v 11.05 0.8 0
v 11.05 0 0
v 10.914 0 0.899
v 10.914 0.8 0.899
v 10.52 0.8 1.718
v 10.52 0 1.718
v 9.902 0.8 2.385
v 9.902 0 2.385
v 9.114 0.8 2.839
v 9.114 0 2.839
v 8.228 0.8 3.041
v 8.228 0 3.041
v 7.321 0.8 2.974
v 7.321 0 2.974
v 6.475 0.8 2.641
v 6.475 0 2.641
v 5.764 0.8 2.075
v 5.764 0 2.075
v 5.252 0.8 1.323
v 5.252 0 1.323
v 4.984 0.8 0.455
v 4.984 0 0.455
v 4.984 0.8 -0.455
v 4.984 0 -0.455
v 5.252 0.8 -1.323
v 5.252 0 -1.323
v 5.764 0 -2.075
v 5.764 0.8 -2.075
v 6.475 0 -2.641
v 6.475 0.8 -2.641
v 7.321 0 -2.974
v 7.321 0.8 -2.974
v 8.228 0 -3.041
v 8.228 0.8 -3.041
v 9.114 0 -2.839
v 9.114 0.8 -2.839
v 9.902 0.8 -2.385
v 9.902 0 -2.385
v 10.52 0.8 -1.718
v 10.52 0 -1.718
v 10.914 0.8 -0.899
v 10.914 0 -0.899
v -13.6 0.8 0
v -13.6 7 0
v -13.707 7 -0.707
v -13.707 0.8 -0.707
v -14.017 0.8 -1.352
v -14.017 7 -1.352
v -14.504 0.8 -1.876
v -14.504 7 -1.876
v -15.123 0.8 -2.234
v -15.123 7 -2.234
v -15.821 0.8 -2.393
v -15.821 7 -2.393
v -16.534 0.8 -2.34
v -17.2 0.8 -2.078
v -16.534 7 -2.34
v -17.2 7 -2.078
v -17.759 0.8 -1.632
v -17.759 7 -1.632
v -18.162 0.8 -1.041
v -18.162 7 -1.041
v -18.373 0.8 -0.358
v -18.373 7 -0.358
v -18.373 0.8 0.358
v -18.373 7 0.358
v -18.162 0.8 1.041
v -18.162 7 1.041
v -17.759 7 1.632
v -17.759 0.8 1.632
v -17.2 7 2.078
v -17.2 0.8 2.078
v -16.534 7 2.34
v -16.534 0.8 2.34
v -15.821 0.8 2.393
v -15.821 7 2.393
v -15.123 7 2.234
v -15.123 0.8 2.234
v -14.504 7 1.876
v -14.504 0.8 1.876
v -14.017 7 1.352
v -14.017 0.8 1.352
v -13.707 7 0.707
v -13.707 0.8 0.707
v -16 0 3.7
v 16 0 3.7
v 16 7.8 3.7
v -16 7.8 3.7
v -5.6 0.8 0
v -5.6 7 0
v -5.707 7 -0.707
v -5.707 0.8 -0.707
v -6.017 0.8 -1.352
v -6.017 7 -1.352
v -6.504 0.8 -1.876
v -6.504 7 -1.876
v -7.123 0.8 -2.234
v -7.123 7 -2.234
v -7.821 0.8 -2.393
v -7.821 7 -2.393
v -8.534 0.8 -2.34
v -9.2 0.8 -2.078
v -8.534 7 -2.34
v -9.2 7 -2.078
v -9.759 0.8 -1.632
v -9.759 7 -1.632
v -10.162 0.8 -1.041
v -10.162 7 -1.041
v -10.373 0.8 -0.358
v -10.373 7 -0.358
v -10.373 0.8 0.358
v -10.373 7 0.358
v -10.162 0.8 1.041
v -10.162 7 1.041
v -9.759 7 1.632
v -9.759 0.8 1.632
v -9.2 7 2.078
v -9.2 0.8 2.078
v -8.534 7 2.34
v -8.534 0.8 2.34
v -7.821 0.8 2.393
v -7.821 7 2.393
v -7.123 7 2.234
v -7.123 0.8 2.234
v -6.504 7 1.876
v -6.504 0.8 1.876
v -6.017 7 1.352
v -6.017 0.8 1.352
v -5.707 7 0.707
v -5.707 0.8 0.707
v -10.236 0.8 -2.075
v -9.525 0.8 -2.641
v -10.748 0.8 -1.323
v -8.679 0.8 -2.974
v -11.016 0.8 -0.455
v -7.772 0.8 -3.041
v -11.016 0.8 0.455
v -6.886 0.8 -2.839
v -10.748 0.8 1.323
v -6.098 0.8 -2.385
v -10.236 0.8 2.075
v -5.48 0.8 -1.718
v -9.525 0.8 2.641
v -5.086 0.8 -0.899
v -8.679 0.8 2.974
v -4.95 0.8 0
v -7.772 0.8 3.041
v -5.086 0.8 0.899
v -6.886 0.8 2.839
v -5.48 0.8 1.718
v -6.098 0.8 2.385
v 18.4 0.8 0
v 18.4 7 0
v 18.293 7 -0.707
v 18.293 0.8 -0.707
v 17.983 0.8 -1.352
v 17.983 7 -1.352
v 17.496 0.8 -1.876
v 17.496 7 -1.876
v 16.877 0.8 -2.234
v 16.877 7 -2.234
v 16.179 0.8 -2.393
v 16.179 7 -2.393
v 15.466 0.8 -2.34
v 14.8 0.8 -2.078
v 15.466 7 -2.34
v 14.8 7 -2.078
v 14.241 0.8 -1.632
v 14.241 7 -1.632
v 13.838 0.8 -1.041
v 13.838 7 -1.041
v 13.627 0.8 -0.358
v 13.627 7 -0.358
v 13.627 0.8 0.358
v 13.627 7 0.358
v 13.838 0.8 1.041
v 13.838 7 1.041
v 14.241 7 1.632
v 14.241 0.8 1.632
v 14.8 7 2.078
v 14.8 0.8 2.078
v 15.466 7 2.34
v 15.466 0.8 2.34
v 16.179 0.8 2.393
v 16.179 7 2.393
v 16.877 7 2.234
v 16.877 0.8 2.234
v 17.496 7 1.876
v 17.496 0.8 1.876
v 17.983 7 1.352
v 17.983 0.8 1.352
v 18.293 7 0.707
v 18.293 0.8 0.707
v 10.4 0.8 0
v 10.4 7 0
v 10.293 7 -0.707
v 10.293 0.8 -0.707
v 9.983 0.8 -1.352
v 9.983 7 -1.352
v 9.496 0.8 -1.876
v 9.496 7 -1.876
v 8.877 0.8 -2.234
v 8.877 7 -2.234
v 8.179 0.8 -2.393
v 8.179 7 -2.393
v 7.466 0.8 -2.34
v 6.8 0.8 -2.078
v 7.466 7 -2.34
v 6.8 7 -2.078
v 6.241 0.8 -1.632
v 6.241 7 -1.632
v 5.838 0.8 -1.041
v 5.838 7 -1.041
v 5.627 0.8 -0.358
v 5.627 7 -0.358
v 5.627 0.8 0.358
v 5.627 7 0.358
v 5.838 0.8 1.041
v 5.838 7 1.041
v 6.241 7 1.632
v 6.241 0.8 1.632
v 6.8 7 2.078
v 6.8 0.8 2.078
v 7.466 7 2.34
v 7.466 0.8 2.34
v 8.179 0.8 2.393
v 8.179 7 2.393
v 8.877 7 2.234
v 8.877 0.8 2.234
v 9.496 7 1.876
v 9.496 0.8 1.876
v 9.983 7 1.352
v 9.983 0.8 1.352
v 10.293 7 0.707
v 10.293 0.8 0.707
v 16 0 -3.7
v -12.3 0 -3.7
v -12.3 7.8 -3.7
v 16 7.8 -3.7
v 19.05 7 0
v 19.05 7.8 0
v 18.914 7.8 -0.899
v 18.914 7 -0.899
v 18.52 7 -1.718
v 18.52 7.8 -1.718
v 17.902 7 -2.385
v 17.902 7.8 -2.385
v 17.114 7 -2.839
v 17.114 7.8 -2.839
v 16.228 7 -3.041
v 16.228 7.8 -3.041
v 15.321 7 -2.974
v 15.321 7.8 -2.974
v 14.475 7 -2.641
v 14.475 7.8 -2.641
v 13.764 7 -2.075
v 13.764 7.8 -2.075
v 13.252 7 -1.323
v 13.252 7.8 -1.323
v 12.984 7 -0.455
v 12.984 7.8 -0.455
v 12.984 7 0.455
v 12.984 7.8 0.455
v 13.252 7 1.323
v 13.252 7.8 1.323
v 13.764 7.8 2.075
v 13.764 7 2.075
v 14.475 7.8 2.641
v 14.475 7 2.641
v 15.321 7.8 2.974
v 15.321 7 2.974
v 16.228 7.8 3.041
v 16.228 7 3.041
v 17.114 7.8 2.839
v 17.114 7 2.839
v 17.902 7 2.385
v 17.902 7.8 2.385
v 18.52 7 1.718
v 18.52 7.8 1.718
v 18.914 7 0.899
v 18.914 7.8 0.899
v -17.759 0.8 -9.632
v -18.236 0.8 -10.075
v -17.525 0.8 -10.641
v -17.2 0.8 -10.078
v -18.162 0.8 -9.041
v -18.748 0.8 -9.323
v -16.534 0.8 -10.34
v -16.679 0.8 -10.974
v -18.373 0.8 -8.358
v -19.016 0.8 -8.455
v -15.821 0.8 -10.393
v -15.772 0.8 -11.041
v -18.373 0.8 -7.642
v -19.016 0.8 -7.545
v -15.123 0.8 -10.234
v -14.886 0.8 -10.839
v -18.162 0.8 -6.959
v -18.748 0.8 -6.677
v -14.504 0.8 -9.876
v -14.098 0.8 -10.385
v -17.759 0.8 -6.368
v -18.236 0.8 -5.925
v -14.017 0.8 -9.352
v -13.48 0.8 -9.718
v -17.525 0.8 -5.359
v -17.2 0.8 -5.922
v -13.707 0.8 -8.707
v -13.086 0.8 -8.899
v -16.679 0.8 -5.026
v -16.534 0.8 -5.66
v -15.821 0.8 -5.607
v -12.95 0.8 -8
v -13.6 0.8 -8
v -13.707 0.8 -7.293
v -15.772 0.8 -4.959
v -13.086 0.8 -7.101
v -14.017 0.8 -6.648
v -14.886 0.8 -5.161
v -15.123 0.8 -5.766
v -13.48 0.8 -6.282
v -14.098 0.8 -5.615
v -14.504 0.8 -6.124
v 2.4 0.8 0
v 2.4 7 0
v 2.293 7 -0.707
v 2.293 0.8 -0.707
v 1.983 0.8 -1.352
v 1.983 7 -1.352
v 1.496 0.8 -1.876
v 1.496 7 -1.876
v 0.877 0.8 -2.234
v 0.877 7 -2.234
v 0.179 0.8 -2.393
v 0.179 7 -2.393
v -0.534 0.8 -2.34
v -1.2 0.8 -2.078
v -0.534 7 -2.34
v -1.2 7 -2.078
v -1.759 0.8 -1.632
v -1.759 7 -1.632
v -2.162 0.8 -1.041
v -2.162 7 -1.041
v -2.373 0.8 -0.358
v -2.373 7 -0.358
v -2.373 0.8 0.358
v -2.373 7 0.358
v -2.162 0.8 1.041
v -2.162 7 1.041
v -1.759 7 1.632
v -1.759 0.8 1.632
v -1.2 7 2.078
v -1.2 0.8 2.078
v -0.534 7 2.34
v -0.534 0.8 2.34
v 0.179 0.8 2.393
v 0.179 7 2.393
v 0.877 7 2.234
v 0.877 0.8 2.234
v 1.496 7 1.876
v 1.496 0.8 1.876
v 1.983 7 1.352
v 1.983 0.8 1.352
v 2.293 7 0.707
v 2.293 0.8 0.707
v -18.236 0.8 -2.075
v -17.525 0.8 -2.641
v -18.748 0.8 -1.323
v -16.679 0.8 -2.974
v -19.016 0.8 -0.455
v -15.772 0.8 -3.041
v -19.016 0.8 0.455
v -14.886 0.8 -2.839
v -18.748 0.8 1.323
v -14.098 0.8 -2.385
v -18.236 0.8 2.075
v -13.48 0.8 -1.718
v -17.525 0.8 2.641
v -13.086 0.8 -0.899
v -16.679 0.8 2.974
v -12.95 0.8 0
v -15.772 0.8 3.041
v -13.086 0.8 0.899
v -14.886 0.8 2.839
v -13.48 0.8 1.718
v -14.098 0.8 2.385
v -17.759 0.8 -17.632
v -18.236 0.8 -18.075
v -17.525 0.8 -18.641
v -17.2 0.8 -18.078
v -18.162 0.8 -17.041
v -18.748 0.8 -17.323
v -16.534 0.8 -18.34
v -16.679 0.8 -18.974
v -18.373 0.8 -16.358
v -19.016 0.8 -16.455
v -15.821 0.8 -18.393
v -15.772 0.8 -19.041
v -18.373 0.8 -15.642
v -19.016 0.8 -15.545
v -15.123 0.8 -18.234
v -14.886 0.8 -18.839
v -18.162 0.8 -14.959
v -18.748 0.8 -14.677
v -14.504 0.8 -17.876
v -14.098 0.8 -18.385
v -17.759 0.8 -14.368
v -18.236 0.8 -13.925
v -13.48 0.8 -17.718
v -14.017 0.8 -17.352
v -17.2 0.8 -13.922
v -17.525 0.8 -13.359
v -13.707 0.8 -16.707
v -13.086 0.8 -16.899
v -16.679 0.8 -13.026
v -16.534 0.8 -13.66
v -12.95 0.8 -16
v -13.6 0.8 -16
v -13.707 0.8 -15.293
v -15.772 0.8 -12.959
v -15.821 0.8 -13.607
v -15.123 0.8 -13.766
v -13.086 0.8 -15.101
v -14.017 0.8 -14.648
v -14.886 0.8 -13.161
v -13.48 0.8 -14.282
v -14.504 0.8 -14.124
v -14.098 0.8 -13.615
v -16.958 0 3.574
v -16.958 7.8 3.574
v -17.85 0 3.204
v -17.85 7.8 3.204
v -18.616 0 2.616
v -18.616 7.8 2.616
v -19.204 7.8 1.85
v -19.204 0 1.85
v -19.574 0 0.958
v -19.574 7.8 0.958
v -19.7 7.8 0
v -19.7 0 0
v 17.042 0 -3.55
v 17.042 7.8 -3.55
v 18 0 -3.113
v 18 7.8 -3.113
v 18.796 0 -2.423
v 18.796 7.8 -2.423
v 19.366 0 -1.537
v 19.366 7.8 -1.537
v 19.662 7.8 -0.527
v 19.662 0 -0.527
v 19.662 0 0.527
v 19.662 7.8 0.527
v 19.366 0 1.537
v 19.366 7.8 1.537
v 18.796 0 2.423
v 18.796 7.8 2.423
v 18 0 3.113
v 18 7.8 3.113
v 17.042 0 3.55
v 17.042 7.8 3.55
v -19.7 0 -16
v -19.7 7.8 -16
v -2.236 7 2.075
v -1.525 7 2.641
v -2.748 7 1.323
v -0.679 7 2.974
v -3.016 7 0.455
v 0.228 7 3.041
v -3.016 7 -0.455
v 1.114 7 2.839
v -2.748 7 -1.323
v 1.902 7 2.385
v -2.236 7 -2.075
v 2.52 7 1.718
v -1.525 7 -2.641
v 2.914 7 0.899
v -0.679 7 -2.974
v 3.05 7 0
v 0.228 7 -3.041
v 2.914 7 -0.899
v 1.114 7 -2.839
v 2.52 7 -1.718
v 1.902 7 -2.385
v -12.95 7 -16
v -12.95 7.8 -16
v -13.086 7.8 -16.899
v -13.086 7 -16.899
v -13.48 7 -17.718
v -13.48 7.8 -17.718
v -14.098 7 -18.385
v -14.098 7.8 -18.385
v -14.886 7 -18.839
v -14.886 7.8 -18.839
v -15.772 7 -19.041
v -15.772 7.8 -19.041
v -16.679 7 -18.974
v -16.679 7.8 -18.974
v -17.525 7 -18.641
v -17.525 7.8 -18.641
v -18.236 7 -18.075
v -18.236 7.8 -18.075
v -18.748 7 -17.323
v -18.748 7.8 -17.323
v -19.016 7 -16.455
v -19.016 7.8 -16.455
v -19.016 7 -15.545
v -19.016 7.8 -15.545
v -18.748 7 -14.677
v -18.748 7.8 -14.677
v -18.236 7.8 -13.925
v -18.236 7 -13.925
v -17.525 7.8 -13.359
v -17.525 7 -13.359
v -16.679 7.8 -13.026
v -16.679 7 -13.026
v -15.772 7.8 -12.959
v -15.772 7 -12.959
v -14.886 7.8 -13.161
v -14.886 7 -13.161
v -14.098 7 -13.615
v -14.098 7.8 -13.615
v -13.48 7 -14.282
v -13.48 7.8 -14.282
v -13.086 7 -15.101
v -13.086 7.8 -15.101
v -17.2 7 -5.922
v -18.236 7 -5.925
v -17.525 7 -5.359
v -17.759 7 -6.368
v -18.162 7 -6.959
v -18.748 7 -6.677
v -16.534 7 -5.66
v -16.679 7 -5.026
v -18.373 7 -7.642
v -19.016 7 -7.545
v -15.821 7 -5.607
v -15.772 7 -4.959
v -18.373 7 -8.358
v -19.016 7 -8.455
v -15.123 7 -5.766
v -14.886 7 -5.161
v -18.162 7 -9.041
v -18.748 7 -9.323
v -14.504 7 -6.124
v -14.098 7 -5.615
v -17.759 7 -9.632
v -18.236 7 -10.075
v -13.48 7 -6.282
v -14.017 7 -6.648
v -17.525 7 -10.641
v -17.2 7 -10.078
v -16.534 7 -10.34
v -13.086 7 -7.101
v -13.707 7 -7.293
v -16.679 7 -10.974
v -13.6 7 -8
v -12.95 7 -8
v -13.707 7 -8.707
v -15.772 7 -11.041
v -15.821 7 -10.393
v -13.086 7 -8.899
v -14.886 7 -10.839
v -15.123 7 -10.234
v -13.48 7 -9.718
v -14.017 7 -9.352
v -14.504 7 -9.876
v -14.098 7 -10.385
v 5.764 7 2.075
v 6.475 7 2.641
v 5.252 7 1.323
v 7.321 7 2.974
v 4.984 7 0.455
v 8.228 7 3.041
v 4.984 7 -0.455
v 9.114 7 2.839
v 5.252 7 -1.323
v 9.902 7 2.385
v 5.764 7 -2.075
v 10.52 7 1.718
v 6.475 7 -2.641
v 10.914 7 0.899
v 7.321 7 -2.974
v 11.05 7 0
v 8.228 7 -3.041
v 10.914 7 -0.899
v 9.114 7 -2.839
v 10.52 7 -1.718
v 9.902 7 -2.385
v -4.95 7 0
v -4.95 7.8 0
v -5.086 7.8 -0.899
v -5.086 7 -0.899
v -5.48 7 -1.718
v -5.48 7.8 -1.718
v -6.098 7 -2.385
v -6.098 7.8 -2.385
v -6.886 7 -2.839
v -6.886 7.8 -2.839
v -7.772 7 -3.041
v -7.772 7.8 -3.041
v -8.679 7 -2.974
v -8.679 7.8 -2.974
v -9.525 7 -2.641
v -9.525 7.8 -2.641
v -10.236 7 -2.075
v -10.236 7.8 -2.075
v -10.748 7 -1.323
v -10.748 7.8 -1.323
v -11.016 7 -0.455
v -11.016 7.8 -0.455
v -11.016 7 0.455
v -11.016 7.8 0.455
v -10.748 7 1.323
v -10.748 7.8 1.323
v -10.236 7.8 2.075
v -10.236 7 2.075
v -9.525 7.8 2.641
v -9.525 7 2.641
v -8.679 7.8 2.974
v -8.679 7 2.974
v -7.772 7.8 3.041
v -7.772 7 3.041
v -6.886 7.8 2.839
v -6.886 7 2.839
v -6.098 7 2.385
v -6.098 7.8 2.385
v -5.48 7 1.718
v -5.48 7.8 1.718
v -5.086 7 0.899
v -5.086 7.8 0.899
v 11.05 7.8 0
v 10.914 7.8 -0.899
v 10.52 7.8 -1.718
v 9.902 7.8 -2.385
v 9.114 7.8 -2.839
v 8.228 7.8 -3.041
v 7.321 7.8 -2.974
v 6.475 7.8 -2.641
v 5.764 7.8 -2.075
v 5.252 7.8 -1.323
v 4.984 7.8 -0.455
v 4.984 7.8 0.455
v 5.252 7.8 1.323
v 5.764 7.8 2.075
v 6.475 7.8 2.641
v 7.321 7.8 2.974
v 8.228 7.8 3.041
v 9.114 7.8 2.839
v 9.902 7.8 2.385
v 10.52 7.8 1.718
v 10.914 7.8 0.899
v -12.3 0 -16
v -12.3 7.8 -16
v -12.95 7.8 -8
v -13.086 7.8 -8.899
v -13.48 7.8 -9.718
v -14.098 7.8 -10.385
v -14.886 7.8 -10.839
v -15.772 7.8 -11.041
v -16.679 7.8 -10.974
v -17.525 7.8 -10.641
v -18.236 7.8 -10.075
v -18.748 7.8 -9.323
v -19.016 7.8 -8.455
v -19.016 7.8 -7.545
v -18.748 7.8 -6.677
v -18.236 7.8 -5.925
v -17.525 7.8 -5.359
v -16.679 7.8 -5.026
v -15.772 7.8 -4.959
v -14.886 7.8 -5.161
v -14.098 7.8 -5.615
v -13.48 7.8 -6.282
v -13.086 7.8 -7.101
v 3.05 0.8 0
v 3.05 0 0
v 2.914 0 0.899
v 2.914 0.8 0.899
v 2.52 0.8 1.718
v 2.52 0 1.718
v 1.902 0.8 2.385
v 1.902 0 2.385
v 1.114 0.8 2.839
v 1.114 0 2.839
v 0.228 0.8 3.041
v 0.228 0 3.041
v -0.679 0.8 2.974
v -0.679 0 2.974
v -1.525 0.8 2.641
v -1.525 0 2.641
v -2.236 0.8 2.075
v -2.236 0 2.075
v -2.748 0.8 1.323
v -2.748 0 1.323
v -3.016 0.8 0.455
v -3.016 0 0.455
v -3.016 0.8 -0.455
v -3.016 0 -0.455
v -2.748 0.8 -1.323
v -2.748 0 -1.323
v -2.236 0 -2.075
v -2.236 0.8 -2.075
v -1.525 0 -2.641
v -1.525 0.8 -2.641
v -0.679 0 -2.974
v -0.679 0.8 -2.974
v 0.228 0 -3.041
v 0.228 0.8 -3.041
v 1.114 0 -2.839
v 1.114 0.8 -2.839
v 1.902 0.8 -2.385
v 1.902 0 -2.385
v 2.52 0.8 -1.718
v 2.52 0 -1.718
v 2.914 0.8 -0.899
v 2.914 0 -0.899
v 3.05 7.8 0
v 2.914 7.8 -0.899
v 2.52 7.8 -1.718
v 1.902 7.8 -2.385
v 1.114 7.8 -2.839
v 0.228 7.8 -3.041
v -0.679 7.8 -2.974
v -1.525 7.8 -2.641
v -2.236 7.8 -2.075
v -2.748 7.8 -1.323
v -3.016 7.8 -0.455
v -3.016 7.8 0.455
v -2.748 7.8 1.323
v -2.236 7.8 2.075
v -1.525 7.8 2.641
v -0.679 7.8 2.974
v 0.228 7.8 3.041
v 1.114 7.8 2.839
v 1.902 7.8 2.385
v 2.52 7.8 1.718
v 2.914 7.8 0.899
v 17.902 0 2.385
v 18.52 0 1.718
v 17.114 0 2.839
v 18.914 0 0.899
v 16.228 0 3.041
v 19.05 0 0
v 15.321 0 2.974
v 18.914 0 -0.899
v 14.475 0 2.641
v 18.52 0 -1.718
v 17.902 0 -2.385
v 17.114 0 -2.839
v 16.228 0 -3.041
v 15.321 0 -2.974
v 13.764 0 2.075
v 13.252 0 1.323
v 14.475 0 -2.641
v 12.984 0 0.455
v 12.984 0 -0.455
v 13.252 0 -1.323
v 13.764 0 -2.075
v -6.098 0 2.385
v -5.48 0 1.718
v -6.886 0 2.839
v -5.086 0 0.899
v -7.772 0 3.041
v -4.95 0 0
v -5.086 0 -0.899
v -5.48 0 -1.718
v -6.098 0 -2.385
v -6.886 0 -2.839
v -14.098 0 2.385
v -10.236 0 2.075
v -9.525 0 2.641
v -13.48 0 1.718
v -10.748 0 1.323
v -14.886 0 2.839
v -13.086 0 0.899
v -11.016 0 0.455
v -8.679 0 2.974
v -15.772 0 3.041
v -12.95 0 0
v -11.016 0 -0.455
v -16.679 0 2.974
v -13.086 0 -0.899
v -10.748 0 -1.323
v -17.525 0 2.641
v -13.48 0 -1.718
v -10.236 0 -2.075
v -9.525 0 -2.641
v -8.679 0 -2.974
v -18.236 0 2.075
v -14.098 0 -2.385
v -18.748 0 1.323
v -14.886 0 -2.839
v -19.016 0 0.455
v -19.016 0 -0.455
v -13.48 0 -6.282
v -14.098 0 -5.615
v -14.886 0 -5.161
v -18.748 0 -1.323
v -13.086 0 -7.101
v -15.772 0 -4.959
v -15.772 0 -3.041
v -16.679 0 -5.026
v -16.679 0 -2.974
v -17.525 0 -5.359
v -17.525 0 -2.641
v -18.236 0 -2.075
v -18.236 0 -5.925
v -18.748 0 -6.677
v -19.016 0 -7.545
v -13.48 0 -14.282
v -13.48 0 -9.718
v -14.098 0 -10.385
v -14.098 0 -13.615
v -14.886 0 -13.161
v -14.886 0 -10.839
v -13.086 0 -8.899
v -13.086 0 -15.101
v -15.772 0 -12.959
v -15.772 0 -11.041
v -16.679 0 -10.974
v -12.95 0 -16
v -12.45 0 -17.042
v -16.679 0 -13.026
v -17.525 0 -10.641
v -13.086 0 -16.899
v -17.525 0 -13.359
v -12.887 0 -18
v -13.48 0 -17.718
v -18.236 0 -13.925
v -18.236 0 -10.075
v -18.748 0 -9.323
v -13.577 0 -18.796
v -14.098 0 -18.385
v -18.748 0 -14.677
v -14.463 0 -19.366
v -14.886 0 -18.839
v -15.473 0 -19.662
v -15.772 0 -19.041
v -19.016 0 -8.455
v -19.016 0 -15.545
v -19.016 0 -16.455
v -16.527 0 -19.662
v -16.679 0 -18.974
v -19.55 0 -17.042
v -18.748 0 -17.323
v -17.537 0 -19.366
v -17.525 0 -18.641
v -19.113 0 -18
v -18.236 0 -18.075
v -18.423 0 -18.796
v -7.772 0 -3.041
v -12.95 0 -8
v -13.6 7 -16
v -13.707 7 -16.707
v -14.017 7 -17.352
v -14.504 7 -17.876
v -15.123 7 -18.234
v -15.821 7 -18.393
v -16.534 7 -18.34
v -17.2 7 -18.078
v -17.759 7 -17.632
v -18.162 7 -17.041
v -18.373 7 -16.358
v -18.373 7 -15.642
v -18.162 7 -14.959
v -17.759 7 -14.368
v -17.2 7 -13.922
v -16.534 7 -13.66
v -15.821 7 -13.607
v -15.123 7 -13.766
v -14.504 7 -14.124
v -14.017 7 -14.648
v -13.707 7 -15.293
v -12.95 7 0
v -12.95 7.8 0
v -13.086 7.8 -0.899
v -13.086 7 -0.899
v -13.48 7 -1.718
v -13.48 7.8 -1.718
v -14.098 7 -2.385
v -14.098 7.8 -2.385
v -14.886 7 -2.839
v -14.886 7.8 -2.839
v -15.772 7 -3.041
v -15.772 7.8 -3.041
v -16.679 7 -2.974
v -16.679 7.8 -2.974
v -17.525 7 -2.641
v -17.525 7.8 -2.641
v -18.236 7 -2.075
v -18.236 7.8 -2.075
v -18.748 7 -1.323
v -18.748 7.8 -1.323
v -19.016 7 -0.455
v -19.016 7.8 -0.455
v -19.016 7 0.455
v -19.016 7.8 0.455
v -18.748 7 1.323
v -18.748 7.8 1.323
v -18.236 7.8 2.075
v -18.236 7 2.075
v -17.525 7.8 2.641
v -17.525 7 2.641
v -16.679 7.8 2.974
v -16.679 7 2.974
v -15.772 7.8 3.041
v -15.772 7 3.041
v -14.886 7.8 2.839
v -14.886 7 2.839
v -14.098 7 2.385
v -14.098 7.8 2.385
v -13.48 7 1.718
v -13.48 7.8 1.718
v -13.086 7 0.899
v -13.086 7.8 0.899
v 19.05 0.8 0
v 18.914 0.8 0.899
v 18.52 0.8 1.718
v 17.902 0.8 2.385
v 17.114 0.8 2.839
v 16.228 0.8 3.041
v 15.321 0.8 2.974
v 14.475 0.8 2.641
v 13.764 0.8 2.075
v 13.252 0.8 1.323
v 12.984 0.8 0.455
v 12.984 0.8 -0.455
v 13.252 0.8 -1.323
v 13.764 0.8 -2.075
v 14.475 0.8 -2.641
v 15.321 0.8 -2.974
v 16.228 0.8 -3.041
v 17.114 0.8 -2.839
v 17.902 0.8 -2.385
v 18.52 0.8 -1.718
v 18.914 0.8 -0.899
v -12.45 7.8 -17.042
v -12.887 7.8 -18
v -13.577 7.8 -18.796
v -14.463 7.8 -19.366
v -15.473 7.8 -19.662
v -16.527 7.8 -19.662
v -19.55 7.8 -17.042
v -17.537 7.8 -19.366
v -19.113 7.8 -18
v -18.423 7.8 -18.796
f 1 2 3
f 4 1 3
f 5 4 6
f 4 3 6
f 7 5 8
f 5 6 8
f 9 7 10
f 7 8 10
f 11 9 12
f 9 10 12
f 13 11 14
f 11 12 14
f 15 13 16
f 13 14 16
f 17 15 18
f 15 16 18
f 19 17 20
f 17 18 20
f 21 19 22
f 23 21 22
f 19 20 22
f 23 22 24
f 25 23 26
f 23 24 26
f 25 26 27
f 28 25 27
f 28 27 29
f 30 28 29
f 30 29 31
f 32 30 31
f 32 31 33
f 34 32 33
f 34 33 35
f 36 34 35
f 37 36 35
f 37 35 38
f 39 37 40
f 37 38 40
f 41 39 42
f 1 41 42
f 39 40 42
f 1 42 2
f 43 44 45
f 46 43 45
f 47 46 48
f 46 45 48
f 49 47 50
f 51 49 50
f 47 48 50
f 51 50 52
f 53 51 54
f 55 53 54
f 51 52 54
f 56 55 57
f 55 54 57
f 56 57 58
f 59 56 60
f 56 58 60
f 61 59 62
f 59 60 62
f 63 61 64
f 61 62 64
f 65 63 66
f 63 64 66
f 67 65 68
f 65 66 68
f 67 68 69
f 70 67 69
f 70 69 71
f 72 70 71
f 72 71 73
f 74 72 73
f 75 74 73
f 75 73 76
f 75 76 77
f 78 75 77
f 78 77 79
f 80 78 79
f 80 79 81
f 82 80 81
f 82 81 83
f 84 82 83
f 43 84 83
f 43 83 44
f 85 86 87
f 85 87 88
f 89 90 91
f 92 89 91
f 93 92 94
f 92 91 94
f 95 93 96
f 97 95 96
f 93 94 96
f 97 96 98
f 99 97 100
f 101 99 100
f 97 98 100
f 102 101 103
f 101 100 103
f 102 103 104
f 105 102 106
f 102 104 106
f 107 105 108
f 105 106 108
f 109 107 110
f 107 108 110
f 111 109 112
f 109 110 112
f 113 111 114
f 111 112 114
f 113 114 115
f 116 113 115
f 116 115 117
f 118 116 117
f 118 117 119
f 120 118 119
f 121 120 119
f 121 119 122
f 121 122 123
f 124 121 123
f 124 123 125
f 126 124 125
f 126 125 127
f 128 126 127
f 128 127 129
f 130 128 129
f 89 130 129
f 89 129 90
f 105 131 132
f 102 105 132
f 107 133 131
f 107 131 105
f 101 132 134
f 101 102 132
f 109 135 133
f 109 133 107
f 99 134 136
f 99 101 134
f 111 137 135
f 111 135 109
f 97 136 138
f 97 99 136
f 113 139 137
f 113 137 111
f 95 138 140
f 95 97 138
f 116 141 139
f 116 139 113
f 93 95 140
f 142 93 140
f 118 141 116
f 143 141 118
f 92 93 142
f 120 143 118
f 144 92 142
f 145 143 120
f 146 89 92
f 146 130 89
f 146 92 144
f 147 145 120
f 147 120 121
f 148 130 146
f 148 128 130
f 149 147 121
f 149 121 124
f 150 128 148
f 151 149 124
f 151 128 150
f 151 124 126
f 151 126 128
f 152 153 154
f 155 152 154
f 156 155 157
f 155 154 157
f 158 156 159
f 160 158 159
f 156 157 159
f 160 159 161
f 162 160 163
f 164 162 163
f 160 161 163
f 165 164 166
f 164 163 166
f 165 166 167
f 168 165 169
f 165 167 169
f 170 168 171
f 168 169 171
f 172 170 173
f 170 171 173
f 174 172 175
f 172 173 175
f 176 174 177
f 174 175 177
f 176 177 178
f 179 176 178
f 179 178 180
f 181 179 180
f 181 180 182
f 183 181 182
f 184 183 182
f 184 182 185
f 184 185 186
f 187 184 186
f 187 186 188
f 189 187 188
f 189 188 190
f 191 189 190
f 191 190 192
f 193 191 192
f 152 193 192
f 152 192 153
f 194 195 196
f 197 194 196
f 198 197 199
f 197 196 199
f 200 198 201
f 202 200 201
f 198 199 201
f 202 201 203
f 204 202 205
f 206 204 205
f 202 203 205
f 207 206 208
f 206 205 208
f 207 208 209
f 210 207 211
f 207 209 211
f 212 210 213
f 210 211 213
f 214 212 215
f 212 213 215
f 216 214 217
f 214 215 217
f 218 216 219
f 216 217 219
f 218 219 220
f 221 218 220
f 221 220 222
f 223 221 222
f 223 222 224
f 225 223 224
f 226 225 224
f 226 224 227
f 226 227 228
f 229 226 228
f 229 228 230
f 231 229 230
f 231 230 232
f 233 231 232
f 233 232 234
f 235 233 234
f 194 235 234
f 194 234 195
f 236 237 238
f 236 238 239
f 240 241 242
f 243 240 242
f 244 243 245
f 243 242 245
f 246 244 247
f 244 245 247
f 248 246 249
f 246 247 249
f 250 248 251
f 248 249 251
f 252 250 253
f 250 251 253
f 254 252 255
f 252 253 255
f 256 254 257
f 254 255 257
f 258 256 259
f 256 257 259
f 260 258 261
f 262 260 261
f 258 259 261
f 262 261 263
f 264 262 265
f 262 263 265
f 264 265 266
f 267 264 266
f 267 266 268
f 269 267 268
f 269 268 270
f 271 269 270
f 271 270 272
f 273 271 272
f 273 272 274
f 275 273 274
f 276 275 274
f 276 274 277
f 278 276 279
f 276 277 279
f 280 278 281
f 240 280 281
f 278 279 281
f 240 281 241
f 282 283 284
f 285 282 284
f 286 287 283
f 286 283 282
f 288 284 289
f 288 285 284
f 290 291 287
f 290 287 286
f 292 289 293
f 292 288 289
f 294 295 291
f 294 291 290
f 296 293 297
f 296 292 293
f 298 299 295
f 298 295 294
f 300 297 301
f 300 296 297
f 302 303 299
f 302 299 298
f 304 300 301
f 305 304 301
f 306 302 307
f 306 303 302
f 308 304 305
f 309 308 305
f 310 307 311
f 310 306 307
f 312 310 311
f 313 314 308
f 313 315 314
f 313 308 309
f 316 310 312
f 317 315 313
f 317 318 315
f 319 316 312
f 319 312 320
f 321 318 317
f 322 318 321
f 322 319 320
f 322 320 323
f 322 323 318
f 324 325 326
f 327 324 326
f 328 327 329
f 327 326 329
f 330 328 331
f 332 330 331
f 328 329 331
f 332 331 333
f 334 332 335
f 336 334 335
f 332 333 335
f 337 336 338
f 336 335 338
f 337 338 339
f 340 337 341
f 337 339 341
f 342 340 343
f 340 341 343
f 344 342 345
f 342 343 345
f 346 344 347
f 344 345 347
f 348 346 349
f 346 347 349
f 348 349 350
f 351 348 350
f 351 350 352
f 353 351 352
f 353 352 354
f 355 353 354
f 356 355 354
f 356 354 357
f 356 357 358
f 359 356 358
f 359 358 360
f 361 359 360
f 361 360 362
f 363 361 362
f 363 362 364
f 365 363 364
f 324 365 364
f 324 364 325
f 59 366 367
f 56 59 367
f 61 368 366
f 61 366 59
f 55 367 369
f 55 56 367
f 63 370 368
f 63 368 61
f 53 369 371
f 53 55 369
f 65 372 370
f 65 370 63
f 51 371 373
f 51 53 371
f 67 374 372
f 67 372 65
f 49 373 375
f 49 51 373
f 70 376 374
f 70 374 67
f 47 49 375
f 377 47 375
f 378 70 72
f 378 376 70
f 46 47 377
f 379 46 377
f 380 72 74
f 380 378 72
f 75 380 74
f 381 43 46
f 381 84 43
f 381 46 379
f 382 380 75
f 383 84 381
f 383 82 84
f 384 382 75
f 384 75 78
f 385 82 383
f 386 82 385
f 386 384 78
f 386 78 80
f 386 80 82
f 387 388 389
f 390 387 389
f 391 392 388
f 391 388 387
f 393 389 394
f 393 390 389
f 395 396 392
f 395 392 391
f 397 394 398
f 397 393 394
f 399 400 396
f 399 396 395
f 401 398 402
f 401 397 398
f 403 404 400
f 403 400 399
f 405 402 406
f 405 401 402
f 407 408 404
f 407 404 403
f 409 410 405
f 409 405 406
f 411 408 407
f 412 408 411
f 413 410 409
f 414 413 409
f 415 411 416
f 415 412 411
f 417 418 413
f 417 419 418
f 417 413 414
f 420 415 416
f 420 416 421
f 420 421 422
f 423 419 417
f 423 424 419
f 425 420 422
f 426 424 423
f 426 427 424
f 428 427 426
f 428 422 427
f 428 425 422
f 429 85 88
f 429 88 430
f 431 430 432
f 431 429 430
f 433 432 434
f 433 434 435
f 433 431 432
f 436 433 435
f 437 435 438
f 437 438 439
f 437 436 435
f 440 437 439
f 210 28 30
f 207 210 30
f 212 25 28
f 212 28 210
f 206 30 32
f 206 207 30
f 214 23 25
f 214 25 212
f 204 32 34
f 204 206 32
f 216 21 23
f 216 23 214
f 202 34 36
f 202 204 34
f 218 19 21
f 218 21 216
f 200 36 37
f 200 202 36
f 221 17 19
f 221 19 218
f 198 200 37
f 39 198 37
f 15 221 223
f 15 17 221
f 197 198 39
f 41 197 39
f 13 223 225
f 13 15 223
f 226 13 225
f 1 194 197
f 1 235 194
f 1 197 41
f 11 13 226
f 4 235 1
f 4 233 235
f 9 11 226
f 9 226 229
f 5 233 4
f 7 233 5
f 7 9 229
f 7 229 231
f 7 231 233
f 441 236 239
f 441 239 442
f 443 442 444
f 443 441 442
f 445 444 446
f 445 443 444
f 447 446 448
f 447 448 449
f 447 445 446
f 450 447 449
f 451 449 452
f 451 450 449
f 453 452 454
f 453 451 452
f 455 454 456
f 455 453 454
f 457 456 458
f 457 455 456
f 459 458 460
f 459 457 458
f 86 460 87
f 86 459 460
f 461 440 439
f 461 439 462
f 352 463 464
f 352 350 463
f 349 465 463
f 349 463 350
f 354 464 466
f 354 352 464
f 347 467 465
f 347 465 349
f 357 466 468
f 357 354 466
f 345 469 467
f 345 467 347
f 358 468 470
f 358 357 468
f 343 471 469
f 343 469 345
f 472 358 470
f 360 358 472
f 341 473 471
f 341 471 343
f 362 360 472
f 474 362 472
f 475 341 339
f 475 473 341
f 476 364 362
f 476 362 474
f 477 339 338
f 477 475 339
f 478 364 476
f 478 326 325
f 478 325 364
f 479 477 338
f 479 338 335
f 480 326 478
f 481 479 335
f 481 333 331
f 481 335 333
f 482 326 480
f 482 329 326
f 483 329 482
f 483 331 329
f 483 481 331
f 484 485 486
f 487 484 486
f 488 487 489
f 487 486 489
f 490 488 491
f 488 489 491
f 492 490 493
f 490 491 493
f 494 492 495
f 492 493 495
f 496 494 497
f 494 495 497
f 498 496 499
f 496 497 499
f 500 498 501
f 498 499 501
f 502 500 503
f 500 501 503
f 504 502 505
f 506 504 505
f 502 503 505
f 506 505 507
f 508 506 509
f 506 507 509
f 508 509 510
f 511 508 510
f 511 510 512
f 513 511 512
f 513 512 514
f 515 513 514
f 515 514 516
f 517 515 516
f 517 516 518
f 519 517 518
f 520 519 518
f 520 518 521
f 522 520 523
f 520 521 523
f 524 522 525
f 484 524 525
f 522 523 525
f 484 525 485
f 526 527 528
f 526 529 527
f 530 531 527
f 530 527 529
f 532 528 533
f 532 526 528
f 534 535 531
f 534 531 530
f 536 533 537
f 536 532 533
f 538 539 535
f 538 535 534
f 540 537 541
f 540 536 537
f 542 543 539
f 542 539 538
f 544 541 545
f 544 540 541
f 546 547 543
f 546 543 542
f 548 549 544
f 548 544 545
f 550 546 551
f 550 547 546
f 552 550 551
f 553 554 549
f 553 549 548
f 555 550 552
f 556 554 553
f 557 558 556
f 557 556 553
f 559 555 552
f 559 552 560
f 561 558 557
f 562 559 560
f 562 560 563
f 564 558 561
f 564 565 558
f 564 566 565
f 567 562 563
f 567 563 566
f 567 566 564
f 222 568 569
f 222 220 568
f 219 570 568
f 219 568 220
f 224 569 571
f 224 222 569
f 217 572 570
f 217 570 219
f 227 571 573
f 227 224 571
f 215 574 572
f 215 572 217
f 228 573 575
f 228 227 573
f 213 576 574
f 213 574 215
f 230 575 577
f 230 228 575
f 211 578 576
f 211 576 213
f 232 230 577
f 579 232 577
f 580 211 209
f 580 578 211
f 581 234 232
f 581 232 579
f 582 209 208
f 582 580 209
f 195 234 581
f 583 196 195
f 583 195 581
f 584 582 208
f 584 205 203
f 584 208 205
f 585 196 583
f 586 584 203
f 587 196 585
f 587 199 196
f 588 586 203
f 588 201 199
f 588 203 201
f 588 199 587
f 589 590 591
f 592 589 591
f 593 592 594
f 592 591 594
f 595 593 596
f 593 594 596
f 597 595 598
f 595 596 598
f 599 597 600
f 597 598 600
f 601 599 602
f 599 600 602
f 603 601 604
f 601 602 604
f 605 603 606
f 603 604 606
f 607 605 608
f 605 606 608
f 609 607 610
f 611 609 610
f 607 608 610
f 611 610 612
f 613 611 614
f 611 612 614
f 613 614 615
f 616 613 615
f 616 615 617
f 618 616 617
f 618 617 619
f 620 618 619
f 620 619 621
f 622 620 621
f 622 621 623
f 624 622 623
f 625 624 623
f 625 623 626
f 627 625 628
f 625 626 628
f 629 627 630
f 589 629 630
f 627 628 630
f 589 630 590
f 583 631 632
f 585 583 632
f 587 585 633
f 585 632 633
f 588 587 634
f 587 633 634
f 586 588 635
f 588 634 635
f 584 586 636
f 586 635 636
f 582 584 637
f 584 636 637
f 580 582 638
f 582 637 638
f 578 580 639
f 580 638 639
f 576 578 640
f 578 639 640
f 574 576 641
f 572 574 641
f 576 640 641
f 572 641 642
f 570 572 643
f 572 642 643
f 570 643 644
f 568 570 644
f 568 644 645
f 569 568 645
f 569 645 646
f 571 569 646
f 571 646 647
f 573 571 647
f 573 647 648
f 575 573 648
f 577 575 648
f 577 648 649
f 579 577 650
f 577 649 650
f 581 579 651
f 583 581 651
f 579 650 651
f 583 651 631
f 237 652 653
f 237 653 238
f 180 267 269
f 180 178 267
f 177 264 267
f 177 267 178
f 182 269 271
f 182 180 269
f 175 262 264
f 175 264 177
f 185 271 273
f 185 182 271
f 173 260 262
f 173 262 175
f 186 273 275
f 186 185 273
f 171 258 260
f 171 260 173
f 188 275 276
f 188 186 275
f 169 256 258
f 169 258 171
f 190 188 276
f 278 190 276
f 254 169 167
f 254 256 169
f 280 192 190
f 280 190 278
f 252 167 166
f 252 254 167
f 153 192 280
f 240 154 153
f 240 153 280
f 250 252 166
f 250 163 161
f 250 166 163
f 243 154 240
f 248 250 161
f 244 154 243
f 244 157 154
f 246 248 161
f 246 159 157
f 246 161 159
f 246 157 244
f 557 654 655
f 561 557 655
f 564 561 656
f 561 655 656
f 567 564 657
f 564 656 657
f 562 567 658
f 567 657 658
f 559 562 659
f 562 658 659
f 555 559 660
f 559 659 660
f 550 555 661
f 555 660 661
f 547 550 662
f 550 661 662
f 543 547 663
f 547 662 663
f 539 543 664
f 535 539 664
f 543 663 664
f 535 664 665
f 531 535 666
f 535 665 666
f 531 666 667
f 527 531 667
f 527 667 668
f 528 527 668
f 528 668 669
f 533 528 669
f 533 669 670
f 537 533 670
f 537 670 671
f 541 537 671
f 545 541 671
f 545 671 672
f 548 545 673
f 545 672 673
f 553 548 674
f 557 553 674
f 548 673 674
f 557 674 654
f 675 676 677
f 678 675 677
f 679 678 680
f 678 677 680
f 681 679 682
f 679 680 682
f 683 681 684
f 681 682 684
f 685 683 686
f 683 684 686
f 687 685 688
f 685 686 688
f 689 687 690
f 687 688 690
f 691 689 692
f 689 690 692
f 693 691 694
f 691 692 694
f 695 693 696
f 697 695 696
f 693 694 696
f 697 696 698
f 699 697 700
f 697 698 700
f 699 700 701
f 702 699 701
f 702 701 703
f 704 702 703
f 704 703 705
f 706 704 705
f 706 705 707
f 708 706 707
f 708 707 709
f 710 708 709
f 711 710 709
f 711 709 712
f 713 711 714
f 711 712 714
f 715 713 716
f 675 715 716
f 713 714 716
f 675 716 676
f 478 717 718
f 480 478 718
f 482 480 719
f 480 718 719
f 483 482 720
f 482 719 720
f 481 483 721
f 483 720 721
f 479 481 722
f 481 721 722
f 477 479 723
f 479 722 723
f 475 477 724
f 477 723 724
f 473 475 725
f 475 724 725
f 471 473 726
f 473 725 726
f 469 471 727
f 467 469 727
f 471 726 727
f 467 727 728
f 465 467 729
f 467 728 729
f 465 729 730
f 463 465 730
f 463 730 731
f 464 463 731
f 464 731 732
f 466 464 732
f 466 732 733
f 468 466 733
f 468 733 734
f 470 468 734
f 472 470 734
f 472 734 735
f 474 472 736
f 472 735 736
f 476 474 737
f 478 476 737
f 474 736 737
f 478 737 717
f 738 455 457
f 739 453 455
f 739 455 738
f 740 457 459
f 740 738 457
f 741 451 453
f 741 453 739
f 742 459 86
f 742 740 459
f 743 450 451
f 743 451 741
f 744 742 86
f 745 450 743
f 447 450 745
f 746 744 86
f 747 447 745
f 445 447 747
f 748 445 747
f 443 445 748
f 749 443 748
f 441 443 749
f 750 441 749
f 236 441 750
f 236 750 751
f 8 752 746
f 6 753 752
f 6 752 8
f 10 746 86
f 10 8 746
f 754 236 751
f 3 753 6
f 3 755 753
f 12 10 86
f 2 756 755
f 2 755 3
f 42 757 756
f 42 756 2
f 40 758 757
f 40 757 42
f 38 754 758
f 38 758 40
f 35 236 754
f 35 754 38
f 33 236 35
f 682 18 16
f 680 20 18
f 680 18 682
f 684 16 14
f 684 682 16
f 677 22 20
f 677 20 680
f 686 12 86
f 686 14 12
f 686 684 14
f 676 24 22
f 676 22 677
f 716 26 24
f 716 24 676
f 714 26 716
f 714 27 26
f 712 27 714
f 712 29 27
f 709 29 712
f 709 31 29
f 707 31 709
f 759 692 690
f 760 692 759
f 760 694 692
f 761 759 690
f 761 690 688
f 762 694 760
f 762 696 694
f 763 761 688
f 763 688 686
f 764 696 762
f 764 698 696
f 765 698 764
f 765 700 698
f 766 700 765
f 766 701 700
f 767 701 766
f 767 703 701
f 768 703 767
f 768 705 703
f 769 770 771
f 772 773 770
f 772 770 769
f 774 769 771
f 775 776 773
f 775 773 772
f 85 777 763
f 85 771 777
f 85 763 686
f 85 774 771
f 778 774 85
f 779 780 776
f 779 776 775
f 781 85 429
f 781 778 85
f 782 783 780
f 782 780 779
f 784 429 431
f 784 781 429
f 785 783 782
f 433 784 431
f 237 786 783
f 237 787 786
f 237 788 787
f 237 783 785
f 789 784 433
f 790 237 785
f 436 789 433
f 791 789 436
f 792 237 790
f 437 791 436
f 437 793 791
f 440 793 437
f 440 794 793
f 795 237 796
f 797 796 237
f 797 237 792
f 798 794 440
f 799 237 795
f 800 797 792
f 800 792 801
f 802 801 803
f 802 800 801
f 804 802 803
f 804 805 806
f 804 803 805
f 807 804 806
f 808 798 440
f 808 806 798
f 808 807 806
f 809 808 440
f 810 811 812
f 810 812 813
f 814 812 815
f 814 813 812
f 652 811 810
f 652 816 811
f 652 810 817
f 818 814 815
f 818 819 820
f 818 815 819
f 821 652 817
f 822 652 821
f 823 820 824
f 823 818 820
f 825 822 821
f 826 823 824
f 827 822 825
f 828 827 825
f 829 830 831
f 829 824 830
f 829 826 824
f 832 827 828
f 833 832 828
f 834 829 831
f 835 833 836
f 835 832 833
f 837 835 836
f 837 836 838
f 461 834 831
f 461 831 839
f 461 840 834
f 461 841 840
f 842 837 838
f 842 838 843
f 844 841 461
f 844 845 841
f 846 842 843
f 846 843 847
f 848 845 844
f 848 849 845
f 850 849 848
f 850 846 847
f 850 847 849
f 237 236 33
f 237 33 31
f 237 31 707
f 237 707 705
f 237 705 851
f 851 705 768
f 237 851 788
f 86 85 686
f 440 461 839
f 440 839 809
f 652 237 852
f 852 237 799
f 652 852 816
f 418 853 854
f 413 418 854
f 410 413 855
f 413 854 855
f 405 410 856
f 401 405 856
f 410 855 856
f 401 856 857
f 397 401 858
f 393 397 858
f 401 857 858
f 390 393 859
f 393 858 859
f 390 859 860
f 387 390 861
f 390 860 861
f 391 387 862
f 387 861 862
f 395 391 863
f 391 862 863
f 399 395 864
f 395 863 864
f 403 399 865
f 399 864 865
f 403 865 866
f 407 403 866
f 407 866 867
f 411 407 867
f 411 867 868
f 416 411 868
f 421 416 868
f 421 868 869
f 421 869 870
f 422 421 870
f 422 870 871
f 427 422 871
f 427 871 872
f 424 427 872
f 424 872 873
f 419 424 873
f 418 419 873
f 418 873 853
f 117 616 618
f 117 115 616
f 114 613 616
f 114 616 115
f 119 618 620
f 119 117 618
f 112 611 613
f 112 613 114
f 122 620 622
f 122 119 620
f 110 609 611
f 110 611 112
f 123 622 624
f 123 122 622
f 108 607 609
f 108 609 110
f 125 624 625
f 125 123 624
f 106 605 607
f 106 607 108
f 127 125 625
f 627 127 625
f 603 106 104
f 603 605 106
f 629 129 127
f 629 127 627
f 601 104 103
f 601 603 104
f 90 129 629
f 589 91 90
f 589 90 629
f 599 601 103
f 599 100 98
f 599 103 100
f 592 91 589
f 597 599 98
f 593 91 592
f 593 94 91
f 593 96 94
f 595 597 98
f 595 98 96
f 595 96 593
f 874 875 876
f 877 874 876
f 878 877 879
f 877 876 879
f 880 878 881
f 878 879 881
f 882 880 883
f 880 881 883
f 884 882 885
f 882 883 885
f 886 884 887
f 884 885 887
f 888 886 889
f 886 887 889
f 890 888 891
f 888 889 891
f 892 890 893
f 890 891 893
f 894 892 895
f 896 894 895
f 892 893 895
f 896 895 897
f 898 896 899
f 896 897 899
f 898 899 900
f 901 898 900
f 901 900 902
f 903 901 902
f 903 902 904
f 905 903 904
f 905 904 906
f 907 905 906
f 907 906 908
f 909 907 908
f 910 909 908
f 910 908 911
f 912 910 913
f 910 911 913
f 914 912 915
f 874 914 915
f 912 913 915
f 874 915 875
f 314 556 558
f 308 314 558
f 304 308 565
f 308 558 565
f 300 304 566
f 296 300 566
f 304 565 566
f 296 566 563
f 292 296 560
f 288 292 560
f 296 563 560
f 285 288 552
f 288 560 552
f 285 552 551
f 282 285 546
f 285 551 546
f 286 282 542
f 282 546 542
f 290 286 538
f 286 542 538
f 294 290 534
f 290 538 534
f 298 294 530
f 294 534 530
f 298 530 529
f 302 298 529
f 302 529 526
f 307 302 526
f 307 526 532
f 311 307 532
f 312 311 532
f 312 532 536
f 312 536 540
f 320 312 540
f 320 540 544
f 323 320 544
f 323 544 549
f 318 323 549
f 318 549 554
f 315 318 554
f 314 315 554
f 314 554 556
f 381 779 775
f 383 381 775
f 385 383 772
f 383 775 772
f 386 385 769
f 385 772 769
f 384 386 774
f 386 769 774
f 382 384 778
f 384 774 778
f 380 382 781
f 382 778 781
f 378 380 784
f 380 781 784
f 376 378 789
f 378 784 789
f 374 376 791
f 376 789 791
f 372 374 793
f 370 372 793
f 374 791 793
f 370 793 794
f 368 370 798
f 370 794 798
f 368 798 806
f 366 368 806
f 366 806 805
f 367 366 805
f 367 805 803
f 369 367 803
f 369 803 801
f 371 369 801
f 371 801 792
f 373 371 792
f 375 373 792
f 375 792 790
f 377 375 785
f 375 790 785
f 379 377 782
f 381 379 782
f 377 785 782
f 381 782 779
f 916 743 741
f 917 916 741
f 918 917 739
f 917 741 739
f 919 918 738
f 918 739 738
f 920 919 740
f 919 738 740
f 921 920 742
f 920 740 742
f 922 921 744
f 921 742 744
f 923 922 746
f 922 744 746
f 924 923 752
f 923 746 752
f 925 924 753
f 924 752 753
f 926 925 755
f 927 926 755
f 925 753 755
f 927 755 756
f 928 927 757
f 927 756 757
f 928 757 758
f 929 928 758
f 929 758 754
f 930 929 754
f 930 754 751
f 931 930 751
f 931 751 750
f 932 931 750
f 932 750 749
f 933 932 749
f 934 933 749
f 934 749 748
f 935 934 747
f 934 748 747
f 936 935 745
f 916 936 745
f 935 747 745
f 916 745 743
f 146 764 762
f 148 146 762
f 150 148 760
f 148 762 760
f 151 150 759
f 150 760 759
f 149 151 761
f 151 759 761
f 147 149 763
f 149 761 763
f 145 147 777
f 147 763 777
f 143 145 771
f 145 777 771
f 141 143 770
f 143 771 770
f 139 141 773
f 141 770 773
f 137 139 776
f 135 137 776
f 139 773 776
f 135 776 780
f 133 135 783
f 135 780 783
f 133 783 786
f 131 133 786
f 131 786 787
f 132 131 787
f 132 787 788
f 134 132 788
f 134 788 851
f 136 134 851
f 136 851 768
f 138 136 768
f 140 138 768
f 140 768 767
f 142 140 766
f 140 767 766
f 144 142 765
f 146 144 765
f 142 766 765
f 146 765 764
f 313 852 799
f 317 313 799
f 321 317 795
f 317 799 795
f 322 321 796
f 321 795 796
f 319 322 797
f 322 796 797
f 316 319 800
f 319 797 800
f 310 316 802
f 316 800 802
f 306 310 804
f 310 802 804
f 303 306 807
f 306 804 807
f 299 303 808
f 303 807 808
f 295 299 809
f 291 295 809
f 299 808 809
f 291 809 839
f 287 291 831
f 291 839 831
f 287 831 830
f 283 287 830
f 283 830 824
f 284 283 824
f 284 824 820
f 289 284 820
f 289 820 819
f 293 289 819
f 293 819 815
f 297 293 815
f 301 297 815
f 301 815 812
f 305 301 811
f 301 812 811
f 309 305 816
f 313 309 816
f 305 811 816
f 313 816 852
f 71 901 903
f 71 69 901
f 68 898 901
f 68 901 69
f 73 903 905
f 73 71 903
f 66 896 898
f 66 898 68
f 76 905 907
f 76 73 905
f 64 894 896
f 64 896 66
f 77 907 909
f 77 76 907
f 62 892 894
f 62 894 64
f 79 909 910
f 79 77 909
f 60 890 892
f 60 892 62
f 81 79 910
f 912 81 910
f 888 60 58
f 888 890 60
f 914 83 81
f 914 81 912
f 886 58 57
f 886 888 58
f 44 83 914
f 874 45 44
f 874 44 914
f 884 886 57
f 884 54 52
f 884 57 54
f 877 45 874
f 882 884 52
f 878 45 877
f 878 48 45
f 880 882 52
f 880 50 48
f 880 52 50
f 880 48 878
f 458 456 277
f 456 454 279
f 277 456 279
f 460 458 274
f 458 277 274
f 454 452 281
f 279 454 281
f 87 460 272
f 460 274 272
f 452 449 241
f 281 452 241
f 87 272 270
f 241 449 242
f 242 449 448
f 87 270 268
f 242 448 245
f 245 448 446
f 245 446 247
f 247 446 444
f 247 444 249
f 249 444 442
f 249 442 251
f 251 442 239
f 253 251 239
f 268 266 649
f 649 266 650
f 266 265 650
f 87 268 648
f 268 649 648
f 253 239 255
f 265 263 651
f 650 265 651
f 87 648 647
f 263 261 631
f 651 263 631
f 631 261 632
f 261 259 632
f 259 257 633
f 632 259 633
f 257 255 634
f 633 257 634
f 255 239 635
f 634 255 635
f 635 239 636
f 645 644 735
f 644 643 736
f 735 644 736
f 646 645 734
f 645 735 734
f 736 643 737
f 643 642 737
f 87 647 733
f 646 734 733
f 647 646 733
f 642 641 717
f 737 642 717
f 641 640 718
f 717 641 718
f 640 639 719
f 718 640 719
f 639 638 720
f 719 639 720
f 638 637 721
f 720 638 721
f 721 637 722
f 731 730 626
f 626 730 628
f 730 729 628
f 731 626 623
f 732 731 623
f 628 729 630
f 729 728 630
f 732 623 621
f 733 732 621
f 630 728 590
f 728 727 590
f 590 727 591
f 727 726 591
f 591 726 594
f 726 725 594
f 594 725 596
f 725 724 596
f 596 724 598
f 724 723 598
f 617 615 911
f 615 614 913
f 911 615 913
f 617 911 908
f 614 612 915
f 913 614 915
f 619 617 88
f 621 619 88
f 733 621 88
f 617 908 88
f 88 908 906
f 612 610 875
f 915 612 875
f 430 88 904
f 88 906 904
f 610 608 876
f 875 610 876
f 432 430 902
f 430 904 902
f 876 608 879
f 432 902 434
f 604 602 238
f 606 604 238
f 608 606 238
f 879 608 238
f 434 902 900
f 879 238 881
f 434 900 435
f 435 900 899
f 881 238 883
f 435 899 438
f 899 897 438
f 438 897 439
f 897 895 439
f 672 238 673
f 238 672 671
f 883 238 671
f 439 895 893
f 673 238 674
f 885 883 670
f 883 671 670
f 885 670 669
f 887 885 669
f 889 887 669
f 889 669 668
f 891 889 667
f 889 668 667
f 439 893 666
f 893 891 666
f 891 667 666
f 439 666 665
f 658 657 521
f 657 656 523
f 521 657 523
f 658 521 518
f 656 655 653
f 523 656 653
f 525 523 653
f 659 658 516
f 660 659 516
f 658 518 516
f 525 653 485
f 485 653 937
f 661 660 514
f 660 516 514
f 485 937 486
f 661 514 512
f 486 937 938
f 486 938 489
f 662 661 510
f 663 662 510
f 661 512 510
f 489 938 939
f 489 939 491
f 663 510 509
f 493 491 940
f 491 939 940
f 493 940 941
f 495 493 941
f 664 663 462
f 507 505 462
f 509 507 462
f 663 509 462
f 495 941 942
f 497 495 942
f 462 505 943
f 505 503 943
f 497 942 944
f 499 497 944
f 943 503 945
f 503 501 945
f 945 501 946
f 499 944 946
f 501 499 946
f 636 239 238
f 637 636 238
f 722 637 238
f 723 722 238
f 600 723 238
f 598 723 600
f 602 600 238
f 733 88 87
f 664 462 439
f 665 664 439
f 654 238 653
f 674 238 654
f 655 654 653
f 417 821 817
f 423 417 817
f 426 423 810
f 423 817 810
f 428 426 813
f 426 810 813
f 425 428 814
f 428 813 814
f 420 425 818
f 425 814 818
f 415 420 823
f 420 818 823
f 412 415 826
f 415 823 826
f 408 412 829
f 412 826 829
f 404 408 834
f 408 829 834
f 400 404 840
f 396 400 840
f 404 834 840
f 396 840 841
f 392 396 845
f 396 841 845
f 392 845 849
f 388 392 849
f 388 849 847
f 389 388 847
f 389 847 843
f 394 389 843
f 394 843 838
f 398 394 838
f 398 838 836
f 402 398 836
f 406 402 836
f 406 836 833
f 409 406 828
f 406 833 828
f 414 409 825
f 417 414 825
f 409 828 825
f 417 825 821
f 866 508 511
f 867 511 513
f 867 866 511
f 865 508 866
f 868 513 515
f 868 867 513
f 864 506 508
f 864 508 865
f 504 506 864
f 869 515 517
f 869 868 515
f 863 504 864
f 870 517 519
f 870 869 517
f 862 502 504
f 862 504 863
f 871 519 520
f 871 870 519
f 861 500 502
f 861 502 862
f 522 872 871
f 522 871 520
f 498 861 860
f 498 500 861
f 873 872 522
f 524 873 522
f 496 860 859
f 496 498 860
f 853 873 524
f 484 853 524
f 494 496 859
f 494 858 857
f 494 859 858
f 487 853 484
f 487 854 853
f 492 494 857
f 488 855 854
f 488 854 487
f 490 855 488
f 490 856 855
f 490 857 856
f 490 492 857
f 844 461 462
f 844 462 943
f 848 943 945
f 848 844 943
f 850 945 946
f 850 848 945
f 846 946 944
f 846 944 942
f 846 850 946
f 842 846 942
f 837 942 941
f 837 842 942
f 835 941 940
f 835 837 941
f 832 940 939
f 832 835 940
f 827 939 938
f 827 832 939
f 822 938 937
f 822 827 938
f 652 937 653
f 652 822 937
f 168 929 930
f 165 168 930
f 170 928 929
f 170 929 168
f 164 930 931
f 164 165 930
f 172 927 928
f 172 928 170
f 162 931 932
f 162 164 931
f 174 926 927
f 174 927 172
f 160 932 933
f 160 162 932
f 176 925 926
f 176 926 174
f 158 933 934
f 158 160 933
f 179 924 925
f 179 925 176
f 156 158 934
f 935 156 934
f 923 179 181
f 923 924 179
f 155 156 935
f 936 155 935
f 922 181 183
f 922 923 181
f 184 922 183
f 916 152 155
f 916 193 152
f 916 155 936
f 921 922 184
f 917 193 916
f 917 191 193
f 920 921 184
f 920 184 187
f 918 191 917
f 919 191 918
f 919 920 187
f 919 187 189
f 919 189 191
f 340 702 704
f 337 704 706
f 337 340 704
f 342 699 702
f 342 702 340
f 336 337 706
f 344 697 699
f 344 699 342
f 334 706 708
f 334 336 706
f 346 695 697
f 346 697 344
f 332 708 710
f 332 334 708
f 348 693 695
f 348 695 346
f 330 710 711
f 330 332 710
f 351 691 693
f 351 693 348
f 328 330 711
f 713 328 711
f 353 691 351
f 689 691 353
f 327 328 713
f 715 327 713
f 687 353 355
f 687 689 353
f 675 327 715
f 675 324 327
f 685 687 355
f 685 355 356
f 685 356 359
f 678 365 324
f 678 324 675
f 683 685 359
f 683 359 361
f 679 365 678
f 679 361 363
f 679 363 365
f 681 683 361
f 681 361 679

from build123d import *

# Parameters (mm, degrees)
BOSS_EXTRUDE3_DEPTH = 7.8
SKETCH2_R           = 2.4
CUT_EXTRUDE9_DEPTH  = 7.8
SKETCH3_R           = 3.05
CUT_EXTRUDE10_DEPTH = 0.8
SKETCH4_R           = 3.05
CUT_EXTRUDE11_DEPTH = 0.8


with BuildPart() as part:
    # Sketch1 → Boss-Extrude3 (new body)
    with BuildSketch(Plane(origin=(0, 0, 0), x_dir=(1, 0, 0), z_dir=(0, 1, 0))):
        with BuildLine():
            Line((-12.3, 3.7), (16, 3.7))
            ThreePointArc((16, 3.7), (19.7, 0), (16, -3.7))
            Line((16, -3.7), (-16, -3.7))
            ThreePointArc((-16, -3.7), (-18.61629509, -2.61629509), (-19.7, 0))
            Line((-19.7, 0), (-19.7, 16))
            ThreePointArc((-19.7, 16), (-16, 19.7), (-12.3, 16))
            Line((-12.3, 16), (-12.3, 3.7))
        make_face()
    extrude(amount=BOSS_EXTRUDE3_DEPTH)

    # Sketch2 → Cut-Extrude9 (cut)
    with BuildSketch(Plane(origin=(0, 7.8, 0), x_dir=(1, 0, 0), z_dir=(0, 1, 0))):
        Circle(SKETCH2_R)
        with Locations((8, 0)):
            Circle(SKETCH2_R)
        with Locations((16, 0)):
            Circle(SKETCH2_R)
        with Locations((-16, 0)):
            Circle(SKETCH2_R)
        with Locations((-8, 0)):
            Circle(SKETCH2_R)
        with Locations((-16, 16)):
            Circle(SKETCH2_R)
        with Locations((-16, 8)):
            Circle(SKETCH2_R)
    extrude(amount=-CUT_EXTRUDE9_DEPTH, mode=Mode.SUBTRACT)

    # Sketch3 → Cut-Extrude10 (cut)
    with BuildSketch(Plane(origin=(0, 7.8, 0), x_dir=(1, 0, 0), z_dir=(0, 1, 0))):
        Circle(SKETCH3_R)
        with Locations((8, 0)):
            Circle(SKETCH3_R)
        with Locations((16, 0)):
            Circle(SKETCH3_R)
        with Locations((-16, 0)):
            Circle(SKETCH3_R)
        with Locations((-8, 0)):
            Circle(SKETCH3_R)
        with Locations((-16, 8)):
            Circle(SKETCH3_R)
        with Locations((-16, 16)):
            Circle(SKETCH3_R)
    extrude(amount=-CUT_EXTRUDE10_DEPTH, mode=Mode.SUBTRACT)

    # Sketch4 → Cut-Extrude11 (cut)
    with BuildSketch(Plane.XZ):
        Circle(SKETCH4_R)
        with Locations((8, 0)):
            Circle(SKETCH4_R)
        with Locations((16, 0)):
            Circle(SKETCH4_R)
        with Locations((-16, 0)):
            Circle(SKETCH4_R)
        with Locations((-8, 0)):
            Circle(SKETCH4_R)
        with Locations((-16, -8)):
            Circle(SKETCH4_R)
        with Locations((-16, -16)):
            Circle(SKETCH4_R)
    extrude(amount=-CUT_EXTRUDE11_DEPTH, mode=Mode.SUBTRACT)


solid = part.part
